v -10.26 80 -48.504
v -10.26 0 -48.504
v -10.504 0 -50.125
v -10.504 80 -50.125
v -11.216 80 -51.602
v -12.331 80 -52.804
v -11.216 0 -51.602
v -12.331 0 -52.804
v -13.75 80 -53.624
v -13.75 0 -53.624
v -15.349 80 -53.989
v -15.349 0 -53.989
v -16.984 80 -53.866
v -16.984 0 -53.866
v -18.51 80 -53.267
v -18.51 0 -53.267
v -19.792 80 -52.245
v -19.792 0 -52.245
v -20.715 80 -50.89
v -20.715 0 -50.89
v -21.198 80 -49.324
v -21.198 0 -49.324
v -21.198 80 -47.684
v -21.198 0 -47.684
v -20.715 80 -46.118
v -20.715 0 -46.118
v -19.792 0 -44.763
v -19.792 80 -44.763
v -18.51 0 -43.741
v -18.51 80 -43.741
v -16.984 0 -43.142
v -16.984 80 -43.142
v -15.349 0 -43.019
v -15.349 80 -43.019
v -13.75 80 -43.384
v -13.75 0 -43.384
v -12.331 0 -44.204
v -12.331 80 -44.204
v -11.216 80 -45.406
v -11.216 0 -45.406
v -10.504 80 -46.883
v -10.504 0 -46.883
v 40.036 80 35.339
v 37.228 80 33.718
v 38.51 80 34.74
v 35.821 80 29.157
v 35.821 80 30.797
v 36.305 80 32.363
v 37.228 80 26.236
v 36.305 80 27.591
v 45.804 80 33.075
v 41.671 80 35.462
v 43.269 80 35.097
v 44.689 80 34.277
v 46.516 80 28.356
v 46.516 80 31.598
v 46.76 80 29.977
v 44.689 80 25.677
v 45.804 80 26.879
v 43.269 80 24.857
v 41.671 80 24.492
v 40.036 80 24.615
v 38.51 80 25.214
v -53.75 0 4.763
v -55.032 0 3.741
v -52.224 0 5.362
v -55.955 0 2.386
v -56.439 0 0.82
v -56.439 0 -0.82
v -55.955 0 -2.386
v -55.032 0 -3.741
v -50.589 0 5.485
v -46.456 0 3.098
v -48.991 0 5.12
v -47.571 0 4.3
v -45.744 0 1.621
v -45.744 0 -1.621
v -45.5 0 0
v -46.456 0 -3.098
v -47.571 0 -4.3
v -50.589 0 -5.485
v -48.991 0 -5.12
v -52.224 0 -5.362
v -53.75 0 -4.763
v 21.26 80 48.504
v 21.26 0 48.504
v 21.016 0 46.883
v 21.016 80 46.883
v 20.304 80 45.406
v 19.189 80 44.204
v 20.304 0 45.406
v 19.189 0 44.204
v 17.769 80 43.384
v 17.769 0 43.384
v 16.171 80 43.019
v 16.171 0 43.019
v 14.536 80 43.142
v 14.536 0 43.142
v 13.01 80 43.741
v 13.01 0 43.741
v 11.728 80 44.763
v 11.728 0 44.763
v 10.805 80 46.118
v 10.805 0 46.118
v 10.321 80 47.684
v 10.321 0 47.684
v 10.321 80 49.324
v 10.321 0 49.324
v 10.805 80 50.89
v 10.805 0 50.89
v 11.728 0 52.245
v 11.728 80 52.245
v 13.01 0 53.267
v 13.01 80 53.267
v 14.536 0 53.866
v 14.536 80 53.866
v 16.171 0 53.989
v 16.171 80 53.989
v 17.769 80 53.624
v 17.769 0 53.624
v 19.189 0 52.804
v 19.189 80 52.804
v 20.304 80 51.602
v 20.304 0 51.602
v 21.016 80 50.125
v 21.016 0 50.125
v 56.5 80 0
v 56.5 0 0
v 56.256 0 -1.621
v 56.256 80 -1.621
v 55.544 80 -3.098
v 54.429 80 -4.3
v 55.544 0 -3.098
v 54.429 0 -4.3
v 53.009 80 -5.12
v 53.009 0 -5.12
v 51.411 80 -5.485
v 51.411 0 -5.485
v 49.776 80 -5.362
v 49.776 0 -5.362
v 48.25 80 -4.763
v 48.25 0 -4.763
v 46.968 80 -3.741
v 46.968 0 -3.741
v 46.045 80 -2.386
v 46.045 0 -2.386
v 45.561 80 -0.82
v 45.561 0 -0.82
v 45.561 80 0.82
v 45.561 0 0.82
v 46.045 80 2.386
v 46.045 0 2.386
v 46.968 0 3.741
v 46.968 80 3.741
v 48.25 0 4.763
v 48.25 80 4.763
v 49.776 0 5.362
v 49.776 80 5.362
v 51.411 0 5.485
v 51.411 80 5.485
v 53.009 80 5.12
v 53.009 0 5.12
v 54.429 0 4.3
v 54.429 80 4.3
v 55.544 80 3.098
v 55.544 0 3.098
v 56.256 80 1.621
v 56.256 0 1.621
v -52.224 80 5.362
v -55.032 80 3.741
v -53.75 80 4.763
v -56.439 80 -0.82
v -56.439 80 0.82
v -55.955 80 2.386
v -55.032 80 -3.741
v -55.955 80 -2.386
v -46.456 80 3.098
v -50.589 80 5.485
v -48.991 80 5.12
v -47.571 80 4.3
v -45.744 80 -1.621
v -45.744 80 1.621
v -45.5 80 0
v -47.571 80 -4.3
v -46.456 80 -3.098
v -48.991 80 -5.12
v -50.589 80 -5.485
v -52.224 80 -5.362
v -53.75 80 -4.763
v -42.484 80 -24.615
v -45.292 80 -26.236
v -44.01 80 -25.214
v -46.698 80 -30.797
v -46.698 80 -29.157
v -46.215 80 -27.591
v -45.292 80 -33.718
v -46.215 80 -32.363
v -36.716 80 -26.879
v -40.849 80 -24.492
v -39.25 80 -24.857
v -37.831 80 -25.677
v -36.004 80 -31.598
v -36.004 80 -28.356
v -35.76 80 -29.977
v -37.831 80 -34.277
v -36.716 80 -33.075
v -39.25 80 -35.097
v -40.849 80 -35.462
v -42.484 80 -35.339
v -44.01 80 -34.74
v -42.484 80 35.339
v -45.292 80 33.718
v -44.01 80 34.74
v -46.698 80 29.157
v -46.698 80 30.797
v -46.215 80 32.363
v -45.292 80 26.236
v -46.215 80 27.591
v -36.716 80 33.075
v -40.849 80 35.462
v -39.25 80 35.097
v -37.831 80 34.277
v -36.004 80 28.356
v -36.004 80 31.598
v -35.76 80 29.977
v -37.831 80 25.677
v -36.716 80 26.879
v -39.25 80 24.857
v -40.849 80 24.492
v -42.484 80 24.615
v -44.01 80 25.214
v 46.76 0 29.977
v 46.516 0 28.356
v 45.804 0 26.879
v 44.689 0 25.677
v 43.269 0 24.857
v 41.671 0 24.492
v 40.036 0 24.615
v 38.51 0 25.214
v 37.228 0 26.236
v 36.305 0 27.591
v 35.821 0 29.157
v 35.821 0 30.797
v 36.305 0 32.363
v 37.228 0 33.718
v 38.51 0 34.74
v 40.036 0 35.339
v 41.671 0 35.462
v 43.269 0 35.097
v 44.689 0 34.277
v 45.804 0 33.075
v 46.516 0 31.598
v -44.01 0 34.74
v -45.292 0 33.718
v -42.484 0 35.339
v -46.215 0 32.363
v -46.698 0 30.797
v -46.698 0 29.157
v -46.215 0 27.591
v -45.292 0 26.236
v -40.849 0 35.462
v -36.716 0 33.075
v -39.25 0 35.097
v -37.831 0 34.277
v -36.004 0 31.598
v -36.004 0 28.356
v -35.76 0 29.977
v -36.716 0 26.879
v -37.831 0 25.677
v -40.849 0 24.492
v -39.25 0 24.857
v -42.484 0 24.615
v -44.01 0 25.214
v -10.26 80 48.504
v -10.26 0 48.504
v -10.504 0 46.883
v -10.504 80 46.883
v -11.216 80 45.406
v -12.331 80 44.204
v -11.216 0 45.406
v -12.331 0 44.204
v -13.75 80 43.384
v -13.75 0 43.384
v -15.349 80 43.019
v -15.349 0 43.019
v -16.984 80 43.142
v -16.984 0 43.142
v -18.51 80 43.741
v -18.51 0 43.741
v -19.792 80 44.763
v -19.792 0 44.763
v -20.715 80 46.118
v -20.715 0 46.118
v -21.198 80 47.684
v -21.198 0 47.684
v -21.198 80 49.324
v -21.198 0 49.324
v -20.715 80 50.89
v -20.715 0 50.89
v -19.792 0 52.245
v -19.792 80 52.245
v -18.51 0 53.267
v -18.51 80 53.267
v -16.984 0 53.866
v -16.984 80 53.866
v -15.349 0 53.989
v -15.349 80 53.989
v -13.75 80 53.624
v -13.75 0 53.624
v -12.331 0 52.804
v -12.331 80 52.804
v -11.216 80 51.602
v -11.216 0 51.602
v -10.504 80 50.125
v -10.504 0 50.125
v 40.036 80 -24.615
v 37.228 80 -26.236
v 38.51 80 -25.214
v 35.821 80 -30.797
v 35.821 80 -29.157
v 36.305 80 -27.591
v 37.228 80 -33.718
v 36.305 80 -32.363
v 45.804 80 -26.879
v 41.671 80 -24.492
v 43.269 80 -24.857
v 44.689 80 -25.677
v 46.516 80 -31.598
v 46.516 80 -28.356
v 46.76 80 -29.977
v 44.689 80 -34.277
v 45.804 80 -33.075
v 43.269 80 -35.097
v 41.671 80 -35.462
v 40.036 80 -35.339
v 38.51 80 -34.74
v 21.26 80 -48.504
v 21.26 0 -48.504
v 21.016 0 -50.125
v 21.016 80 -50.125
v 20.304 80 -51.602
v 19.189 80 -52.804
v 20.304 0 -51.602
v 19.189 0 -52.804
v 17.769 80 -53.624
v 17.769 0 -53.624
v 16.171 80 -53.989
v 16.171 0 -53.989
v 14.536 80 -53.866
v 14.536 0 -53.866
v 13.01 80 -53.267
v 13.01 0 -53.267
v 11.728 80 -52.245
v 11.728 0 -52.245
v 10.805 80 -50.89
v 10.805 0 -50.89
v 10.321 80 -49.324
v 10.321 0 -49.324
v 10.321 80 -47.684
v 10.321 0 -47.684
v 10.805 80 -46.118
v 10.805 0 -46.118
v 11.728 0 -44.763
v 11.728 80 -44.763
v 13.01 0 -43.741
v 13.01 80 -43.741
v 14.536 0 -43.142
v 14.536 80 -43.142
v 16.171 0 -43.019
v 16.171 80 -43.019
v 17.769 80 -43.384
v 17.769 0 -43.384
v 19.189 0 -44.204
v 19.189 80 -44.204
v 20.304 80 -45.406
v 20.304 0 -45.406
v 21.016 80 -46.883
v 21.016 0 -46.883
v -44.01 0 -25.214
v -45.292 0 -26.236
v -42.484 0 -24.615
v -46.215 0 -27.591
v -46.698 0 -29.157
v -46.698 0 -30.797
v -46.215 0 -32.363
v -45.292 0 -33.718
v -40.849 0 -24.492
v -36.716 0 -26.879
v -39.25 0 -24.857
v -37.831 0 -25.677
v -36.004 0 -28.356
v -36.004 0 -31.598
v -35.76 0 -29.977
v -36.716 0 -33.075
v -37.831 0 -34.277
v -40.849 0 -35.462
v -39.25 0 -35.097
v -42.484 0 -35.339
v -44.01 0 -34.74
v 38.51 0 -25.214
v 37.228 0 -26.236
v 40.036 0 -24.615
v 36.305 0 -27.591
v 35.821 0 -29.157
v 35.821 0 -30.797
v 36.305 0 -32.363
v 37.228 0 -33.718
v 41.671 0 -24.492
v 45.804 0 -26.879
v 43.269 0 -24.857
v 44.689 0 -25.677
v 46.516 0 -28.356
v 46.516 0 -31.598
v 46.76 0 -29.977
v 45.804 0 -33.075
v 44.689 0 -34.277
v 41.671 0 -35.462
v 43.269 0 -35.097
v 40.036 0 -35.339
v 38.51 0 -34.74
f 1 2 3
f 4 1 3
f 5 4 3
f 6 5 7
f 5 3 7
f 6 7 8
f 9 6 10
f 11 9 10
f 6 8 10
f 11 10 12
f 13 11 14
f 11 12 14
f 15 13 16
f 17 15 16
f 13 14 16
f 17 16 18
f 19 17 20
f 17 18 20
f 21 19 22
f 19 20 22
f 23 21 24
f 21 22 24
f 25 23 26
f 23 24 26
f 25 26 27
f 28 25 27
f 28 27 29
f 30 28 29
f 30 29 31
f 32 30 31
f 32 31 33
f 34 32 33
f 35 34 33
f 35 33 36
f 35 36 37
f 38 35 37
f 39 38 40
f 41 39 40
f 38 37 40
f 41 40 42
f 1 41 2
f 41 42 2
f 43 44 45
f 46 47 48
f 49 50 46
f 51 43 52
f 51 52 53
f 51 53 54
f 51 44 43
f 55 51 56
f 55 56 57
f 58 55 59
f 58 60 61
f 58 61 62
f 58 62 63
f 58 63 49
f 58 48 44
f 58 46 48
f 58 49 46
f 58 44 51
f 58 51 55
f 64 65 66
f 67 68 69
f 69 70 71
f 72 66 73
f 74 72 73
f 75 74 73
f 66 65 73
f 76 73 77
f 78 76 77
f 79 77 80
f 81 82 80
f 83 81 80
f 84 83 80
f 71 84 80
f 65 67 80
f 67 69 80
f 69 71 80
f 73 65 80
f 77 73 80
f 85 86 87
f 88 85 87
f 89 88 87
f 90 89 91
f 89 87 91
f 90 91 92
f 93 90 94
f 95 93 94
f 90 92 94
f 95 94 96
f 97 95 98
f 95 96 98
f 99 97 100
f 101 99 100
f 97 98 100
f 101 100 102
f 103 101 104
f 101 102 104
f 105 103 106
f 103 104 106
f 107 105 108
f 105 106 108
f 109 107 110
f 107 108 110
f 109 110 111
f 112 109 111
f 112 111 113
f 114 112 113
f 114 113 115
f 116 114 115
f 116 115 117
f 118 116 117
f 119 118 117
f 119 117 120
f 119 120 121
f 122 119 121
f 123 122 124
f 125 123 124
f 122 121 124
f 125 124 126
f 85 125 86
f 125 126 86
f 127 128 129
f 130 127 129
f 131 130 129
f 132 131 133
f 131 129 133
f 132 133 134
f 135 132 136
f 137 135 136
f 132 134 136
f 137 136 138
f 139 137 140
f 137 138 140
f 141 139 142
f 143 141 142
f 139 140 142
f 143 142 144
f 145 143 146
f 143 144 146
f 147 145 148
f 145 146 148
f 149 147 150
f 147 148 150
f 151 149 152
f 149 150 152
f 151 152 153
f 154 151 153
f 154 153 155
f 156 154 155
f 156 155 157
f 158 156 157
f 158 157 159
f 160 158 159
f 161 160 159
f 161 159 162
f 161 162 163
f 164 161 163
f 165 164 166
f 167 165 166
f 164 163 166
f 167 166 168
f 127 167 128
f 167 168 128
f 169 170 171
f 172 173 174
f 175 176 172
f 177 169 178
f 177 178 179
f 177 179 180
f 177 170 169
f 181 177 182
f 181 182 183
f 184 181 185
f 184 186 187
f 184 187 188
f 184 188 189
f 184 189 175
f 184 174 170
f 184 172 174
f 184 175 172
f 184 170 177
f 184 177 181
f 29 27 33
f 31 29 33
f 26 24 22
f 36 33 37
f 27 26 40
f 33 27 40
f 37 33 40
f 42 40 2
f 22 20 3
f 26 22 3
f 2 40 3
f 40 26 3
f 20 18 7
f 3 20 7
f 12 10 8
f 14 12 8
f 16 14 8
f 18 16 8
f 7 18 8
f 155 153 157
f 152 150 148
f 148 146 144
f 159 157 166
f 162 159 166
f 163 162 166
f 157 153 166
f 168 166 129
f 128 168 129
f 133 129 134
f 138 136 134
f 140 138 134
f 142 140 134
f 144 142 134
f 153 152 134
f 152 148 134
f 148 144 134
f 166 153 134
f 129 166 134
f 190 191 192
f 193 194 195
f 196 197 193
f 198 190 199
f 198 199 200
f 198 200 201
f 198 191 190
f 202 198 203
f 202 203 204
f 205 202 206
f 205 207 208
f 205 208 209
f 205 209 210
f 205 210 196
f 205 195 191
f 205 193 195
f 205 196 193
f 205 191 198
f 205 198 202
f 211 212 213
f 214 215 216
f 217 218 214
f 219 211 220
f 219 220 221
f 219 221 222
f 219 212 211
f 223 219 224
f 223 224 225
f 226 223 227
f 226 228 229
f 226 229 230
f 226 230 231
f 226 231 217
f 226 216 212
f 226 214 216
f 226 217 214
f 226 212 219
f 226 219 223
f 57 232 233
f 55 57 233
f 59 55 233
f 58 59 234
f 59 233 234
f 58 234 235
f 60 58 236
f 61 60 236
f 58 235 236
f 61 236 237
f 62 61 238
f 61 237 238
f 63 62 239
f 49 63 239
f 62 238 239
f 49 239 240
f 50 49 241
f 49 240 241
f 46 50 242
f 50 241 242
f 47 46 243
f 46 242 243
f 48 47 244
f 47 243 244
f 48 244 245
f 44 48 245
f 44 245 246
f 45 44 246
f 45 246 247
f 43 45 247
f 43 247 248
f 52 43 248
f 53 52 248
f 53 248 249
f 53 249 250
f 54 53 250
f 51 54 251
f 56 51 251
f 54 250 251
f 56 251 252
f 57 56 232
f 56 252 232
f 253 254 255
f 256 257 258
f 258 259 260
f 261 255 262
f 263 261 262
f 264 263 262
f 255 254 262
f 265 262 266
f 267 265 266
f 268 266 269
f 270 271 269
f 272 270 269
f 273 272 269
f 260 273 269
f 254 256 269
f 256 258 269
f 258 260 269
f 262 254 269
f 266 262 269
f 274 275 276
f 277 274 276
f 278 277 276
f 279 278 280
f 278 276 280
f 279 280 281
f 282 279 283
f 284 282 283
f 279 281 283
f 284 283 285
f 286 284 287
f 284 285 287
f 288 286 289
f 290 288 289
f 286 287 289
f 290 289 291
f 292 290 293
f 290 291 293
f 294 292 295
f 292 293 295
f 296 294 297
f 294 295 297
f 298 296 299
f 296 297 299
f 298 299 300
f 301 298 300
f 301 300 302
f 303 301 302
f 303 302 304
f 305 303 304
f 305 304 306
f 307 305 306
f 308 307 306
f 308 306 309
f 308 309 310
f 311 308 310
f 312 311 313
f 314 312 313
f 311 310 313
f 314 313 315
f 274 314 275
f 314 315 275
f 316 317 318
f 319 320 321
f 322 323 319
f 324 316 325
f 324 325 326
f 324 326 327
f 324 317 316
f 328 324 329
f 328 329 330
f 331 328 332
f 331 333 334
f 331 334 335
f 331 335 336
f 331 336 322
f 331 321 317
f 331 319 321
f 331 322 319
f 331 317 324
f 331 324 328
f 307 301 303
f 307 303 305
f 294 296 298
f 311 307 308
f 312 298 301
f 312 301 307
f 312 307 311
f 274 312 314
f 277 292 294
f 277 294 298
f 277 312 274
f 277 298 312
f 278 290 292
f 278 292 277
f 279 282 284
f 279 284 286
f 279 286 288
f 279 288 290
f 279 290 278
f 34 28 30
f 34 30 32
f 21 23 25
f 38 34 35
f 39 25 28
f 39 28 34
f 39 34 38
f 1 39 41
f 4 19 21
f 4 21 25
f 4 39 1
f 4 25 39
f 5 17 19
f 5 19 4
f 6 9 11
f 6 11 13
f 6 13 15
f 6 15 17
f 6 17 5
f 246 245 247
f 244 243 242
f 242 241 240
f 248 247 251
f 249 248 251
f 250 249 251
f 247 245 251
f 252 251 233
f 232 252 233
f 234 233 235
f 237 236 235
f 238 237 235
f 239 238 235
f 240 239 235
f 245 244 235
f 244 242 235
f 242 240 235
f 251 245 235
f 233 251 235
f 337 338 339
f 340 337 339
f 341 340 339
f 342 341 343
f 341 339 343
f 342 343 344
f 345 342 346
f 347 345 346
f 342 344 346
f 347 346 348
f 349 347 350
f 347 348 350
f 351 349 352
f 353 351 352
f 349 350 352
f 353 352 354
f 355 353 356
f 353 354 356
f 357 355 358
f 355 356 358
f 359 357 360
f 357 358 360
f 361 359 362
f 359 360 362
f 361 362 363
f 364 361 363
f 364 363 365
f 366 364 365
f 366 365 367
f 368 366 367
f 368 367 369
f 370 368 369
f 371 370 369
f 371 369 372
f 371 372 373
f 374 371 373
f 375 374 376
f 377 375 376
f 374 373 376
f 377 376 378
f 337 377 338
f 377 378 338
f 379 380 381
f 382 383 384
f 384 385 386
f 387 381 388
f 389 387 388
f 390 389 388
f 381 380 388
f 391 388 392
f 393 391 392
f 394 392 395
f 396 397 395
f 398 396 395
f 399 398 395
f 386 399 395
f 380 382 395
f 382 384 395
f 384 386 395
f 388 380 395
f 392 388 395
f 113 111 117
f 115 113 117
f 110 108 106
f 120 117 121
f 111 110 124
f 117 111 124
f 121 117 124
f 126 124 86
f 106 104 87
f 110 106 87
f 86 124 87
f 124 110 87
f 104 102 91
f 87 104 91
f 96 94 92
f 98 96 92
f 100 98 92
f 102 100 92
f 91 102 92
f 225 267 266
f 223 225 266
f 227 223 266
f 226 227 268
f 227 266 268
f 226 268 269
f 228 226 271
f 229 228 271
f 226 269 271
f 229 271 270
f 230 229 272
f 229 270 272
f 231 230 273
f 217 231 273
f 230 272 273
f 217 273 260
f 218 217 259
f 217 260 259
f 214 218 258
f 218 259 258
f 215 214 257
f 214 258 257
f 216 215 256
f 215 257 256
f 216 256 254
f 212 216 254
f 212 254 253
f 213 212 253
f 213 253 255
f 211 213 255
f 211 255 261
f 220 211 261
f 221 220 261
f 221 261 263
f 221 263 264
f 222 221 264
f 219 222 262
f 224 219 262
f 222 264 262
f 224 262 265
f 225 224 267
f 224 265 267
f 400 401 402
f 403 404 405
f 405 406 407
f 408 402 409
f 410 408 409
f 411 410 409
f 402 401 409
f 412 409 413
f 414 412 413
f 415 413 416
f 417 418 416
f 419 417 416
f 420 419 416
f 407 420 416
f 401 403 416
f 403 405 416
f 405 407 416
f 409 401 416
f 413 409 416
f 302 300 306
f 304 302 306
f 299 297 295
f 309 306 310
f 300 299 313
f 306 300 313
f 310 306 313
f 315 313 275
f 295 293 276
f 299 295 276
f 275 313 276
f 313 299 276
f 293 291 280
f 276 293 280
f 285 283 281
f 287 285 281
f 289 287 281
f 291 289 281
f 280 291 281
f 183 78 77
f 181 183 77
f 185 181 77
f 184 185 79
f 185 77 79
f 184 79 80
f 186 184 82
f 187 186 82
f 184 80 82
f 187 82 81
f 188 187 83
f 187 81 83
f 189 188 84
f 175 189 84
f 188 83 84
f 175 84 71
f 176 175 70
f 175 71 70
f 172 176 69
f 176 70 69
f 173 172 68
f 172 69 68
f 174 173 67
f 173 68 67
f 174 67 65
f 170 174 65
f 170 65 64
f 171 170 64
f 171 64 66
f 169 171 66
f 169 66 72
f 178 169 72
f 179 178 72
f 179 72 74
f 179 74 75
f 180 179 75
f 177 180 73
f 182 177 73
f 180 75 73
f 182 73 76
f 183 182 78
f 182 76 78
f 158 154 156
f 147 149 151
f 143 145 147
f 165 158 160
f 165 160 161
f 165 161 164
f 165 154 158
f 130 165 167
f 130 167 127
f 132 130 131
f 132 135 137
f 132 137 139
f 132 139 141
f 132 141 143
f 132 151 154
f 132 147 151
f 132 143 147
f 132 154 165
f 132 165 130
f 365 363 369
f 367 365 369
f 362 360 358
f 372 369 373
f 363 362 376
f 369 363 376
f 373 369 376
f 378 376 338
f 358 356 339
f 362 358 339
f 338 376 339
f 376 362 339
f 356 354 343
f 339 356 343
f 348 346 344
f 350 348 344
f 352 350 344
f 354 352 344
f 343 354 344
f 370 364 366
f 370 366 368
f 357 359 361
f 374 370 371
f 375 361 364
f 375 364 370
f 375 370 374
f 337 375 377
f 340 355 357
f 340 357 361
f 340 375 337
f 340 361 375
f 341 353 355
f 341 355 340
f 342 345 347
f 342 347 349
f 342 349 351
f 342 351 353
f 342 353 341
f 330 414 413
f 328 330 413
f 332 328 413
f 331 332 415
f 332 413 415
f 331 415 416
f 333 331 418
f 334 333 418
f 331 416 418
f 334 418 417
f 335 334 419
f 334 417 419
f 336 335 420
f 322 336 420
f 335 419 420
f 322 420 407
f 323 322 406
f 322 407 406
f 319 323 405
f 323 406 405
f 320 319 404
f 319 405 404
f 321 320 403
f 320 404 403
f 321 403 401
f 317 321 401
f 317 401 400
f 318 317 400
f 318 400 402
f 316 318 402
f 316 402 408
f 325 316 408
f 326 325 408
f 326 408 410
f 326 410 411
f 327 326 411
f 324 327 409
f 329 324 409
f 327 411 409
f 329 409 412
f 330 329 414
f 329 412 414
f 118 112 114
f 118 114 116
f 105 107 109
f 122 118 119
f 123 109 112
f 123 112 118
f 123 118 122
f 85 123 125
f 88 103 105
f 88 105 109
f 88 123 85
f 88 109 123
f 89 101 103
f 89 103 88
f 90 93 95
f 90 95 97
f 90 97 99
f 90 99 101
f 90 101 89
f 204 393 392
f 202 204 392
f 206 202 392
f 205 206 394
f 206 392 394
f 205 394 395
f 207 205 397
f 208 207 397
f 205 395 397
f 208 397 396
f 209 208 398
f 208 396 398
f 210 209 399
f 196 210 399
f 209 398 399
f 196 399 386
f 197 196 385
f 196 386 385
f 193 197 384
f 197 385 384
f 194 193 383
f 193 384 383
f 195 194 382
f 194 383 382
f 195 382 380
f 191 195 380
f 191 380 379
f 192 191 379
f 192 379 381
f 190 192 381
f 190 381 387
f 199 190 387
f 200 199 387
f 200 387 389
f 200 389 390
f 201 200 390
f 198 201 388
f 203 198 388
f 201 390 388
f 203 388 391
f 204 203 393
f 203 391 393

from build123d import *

# Parameters (mm, degrees)
SKETCH1_R              = 5.5
BOSS_EXTRUDE1_DEPTH    = 80
BOSS_EXTRUDE1_2_DEPTH  = 80
BOSS_EXTRUDE1_3_DEPTH  = 80
BOSS_EXTRUDE1_4_DEPTH  = 80
BOSS_EXTRUDE1_5_DEPTH  = 80
BOSS_EXTRUDE1_6_DEPTH  = 80
BOSS_EXTRUDE1_7_DEPTH  = 80
BOSS_EXTRUDE1_8_DEPTH  = 80
BOSS_EXTRUDE1_9_DEPTH  = 80
BOSS_EXTRUDE1_10_DEPTH = 80


with BuildPart() as part:
    # Sketch1 → Boss-Extrude1 (new body)
    with BuildSketch(Plane(origin=(0, 0, 0), x_dir=(1, 0, 0), z_dir=(0, 1, 0))):
        with Locations((51, 0)):
            Circle(SKETCH1_R)
    extrude(amount=BOSS_EXTRUDE1_DEPTH)


with BuildPart() as body_2:
    # Sketch1 → Boss-Extrude1 2 (new body)
    with BuildSketch(Plane(origin=(0, 0, 0), x_dir=(1, 0, 0), z_dir=(0, 1, 0))):
        with Locations((41.259866713, -29.977047867)):
            Circle(SKETCH1_R)
    extrude(amount=BOSS_EXTRUDE1_2_DEPTH)


with BuildPart() as body_3:
    # Sketch1 → Boss-Extrude1 3 (new body)
    with BuildSketch(Plane(origin=(0, 0, 0), x_dir=(1, 0, 0), z_dir=(0, 1, 0))):
        with Locations((15.759866713, -48.503882331)):
            Circle(SKETCH1_R)
    extrude(amount=BOSS_EXTRUDE1_3_DEPTH)


with BuildPart() as body_4:
    # Sketch1 → Boss-Extrude1 4 (new body)
    with BuildSketch(Plane(origin=(0, 0, 0), x_dir=(1, 0, 0), z_dir=(0, 1, 0))):
        with Locations((-15.759866713, -48.503882331)):
            Circle(SKETCH1_R)
    extrude(amount=BOSS_EXTRUDE1_4_DEPTH)


with BuildPart() as body_5:
    # Sketch1 → Boss-Extrude1 5 (new body)
    with BuildSketch(Plane(origin=(0, 0, 0), x_dir=(1, 0, 0), z_dir=(0, 1, 0))):
        with Locations((-41.259866713, -29.977047867)):
            Circle(SKETCH1_R)
    extrude(amount=BOSS_EXTRUDE1_5_DEPTH)


with BuildPart() as body_6:
    # Sketch1 → Boss-Extrude1 6 (new body)
    with BuildSketch(Plane(origin=(0, 0, 0), x_dir=(1, 0, 0), z_dir=(0, 1, 0))):
        with Locations((-51, 0)):
            Circle(SKETCH1_R)
    extrude(amount=BOSS_EXTRUDE1_6_DEPTH)


with BuildPart() as body_7:
    # Sketch1 → Boss-Extrude1 7 (new body)
    with BuildSketch(Plane(origin=(0, 0, 0), x_dir=(1, 0, 0), z_dir=(0, 1, 0))):
        with Locations((-41.259866713, 29.977047867)):
            Circle(SKETCH1_R)
    extrude(amount=BOSS_EXTRUDE1_7_DEPTH)


with BuildPart() as body_8:
    # Sketch1 → Boss-Extrude1 8 (new body)
    with BuildSketch(Plane(origin=(0, 0, 0), x_dir=(1, 0, 0), z_dir=(0, 1, 0))):
        with Locations((-15.759866713, 48.503882331)):
            Circle(SKETCH1_R)
    extrude(amount=BOSS_EXTRUDE1_8_DEPTH)


with BuildPart() as body_9:
    # Sketch1 → Boss-Extrude1 9 (new body)
    with BuildSketch(Plane(origin=(0, 0, 0), x_dir=(1, 0, 0), z_dir=(0, 1, 0))):
        with Locations((15.759866713, 48.503882331)):
            Circle(SKETCH1_R)
    extrude(amount=BOSS_EXTRUDE1_9_DEPTH)


with BuildPart() as body_10:
    # Sketch1 → Boss-Extrude1 10 (new body)
    with BuildSketch(Plane(origin=(0, 0, 0), x_dir=(1, 0, 0), z_dir=(0, 1, 0))):
        with Locations((41.259866713, 29.977047867)):
            Circle(SKETCH1_R)
    extrude(amount=BOSS_EXTRUDE1_10_DEPTH)


solid = Compound([part.part, body_2.part, body_3.part, body_4.part, body_5.part, body_6.part, body_7.part, body_8.part, body_9.part, body_10.part])
